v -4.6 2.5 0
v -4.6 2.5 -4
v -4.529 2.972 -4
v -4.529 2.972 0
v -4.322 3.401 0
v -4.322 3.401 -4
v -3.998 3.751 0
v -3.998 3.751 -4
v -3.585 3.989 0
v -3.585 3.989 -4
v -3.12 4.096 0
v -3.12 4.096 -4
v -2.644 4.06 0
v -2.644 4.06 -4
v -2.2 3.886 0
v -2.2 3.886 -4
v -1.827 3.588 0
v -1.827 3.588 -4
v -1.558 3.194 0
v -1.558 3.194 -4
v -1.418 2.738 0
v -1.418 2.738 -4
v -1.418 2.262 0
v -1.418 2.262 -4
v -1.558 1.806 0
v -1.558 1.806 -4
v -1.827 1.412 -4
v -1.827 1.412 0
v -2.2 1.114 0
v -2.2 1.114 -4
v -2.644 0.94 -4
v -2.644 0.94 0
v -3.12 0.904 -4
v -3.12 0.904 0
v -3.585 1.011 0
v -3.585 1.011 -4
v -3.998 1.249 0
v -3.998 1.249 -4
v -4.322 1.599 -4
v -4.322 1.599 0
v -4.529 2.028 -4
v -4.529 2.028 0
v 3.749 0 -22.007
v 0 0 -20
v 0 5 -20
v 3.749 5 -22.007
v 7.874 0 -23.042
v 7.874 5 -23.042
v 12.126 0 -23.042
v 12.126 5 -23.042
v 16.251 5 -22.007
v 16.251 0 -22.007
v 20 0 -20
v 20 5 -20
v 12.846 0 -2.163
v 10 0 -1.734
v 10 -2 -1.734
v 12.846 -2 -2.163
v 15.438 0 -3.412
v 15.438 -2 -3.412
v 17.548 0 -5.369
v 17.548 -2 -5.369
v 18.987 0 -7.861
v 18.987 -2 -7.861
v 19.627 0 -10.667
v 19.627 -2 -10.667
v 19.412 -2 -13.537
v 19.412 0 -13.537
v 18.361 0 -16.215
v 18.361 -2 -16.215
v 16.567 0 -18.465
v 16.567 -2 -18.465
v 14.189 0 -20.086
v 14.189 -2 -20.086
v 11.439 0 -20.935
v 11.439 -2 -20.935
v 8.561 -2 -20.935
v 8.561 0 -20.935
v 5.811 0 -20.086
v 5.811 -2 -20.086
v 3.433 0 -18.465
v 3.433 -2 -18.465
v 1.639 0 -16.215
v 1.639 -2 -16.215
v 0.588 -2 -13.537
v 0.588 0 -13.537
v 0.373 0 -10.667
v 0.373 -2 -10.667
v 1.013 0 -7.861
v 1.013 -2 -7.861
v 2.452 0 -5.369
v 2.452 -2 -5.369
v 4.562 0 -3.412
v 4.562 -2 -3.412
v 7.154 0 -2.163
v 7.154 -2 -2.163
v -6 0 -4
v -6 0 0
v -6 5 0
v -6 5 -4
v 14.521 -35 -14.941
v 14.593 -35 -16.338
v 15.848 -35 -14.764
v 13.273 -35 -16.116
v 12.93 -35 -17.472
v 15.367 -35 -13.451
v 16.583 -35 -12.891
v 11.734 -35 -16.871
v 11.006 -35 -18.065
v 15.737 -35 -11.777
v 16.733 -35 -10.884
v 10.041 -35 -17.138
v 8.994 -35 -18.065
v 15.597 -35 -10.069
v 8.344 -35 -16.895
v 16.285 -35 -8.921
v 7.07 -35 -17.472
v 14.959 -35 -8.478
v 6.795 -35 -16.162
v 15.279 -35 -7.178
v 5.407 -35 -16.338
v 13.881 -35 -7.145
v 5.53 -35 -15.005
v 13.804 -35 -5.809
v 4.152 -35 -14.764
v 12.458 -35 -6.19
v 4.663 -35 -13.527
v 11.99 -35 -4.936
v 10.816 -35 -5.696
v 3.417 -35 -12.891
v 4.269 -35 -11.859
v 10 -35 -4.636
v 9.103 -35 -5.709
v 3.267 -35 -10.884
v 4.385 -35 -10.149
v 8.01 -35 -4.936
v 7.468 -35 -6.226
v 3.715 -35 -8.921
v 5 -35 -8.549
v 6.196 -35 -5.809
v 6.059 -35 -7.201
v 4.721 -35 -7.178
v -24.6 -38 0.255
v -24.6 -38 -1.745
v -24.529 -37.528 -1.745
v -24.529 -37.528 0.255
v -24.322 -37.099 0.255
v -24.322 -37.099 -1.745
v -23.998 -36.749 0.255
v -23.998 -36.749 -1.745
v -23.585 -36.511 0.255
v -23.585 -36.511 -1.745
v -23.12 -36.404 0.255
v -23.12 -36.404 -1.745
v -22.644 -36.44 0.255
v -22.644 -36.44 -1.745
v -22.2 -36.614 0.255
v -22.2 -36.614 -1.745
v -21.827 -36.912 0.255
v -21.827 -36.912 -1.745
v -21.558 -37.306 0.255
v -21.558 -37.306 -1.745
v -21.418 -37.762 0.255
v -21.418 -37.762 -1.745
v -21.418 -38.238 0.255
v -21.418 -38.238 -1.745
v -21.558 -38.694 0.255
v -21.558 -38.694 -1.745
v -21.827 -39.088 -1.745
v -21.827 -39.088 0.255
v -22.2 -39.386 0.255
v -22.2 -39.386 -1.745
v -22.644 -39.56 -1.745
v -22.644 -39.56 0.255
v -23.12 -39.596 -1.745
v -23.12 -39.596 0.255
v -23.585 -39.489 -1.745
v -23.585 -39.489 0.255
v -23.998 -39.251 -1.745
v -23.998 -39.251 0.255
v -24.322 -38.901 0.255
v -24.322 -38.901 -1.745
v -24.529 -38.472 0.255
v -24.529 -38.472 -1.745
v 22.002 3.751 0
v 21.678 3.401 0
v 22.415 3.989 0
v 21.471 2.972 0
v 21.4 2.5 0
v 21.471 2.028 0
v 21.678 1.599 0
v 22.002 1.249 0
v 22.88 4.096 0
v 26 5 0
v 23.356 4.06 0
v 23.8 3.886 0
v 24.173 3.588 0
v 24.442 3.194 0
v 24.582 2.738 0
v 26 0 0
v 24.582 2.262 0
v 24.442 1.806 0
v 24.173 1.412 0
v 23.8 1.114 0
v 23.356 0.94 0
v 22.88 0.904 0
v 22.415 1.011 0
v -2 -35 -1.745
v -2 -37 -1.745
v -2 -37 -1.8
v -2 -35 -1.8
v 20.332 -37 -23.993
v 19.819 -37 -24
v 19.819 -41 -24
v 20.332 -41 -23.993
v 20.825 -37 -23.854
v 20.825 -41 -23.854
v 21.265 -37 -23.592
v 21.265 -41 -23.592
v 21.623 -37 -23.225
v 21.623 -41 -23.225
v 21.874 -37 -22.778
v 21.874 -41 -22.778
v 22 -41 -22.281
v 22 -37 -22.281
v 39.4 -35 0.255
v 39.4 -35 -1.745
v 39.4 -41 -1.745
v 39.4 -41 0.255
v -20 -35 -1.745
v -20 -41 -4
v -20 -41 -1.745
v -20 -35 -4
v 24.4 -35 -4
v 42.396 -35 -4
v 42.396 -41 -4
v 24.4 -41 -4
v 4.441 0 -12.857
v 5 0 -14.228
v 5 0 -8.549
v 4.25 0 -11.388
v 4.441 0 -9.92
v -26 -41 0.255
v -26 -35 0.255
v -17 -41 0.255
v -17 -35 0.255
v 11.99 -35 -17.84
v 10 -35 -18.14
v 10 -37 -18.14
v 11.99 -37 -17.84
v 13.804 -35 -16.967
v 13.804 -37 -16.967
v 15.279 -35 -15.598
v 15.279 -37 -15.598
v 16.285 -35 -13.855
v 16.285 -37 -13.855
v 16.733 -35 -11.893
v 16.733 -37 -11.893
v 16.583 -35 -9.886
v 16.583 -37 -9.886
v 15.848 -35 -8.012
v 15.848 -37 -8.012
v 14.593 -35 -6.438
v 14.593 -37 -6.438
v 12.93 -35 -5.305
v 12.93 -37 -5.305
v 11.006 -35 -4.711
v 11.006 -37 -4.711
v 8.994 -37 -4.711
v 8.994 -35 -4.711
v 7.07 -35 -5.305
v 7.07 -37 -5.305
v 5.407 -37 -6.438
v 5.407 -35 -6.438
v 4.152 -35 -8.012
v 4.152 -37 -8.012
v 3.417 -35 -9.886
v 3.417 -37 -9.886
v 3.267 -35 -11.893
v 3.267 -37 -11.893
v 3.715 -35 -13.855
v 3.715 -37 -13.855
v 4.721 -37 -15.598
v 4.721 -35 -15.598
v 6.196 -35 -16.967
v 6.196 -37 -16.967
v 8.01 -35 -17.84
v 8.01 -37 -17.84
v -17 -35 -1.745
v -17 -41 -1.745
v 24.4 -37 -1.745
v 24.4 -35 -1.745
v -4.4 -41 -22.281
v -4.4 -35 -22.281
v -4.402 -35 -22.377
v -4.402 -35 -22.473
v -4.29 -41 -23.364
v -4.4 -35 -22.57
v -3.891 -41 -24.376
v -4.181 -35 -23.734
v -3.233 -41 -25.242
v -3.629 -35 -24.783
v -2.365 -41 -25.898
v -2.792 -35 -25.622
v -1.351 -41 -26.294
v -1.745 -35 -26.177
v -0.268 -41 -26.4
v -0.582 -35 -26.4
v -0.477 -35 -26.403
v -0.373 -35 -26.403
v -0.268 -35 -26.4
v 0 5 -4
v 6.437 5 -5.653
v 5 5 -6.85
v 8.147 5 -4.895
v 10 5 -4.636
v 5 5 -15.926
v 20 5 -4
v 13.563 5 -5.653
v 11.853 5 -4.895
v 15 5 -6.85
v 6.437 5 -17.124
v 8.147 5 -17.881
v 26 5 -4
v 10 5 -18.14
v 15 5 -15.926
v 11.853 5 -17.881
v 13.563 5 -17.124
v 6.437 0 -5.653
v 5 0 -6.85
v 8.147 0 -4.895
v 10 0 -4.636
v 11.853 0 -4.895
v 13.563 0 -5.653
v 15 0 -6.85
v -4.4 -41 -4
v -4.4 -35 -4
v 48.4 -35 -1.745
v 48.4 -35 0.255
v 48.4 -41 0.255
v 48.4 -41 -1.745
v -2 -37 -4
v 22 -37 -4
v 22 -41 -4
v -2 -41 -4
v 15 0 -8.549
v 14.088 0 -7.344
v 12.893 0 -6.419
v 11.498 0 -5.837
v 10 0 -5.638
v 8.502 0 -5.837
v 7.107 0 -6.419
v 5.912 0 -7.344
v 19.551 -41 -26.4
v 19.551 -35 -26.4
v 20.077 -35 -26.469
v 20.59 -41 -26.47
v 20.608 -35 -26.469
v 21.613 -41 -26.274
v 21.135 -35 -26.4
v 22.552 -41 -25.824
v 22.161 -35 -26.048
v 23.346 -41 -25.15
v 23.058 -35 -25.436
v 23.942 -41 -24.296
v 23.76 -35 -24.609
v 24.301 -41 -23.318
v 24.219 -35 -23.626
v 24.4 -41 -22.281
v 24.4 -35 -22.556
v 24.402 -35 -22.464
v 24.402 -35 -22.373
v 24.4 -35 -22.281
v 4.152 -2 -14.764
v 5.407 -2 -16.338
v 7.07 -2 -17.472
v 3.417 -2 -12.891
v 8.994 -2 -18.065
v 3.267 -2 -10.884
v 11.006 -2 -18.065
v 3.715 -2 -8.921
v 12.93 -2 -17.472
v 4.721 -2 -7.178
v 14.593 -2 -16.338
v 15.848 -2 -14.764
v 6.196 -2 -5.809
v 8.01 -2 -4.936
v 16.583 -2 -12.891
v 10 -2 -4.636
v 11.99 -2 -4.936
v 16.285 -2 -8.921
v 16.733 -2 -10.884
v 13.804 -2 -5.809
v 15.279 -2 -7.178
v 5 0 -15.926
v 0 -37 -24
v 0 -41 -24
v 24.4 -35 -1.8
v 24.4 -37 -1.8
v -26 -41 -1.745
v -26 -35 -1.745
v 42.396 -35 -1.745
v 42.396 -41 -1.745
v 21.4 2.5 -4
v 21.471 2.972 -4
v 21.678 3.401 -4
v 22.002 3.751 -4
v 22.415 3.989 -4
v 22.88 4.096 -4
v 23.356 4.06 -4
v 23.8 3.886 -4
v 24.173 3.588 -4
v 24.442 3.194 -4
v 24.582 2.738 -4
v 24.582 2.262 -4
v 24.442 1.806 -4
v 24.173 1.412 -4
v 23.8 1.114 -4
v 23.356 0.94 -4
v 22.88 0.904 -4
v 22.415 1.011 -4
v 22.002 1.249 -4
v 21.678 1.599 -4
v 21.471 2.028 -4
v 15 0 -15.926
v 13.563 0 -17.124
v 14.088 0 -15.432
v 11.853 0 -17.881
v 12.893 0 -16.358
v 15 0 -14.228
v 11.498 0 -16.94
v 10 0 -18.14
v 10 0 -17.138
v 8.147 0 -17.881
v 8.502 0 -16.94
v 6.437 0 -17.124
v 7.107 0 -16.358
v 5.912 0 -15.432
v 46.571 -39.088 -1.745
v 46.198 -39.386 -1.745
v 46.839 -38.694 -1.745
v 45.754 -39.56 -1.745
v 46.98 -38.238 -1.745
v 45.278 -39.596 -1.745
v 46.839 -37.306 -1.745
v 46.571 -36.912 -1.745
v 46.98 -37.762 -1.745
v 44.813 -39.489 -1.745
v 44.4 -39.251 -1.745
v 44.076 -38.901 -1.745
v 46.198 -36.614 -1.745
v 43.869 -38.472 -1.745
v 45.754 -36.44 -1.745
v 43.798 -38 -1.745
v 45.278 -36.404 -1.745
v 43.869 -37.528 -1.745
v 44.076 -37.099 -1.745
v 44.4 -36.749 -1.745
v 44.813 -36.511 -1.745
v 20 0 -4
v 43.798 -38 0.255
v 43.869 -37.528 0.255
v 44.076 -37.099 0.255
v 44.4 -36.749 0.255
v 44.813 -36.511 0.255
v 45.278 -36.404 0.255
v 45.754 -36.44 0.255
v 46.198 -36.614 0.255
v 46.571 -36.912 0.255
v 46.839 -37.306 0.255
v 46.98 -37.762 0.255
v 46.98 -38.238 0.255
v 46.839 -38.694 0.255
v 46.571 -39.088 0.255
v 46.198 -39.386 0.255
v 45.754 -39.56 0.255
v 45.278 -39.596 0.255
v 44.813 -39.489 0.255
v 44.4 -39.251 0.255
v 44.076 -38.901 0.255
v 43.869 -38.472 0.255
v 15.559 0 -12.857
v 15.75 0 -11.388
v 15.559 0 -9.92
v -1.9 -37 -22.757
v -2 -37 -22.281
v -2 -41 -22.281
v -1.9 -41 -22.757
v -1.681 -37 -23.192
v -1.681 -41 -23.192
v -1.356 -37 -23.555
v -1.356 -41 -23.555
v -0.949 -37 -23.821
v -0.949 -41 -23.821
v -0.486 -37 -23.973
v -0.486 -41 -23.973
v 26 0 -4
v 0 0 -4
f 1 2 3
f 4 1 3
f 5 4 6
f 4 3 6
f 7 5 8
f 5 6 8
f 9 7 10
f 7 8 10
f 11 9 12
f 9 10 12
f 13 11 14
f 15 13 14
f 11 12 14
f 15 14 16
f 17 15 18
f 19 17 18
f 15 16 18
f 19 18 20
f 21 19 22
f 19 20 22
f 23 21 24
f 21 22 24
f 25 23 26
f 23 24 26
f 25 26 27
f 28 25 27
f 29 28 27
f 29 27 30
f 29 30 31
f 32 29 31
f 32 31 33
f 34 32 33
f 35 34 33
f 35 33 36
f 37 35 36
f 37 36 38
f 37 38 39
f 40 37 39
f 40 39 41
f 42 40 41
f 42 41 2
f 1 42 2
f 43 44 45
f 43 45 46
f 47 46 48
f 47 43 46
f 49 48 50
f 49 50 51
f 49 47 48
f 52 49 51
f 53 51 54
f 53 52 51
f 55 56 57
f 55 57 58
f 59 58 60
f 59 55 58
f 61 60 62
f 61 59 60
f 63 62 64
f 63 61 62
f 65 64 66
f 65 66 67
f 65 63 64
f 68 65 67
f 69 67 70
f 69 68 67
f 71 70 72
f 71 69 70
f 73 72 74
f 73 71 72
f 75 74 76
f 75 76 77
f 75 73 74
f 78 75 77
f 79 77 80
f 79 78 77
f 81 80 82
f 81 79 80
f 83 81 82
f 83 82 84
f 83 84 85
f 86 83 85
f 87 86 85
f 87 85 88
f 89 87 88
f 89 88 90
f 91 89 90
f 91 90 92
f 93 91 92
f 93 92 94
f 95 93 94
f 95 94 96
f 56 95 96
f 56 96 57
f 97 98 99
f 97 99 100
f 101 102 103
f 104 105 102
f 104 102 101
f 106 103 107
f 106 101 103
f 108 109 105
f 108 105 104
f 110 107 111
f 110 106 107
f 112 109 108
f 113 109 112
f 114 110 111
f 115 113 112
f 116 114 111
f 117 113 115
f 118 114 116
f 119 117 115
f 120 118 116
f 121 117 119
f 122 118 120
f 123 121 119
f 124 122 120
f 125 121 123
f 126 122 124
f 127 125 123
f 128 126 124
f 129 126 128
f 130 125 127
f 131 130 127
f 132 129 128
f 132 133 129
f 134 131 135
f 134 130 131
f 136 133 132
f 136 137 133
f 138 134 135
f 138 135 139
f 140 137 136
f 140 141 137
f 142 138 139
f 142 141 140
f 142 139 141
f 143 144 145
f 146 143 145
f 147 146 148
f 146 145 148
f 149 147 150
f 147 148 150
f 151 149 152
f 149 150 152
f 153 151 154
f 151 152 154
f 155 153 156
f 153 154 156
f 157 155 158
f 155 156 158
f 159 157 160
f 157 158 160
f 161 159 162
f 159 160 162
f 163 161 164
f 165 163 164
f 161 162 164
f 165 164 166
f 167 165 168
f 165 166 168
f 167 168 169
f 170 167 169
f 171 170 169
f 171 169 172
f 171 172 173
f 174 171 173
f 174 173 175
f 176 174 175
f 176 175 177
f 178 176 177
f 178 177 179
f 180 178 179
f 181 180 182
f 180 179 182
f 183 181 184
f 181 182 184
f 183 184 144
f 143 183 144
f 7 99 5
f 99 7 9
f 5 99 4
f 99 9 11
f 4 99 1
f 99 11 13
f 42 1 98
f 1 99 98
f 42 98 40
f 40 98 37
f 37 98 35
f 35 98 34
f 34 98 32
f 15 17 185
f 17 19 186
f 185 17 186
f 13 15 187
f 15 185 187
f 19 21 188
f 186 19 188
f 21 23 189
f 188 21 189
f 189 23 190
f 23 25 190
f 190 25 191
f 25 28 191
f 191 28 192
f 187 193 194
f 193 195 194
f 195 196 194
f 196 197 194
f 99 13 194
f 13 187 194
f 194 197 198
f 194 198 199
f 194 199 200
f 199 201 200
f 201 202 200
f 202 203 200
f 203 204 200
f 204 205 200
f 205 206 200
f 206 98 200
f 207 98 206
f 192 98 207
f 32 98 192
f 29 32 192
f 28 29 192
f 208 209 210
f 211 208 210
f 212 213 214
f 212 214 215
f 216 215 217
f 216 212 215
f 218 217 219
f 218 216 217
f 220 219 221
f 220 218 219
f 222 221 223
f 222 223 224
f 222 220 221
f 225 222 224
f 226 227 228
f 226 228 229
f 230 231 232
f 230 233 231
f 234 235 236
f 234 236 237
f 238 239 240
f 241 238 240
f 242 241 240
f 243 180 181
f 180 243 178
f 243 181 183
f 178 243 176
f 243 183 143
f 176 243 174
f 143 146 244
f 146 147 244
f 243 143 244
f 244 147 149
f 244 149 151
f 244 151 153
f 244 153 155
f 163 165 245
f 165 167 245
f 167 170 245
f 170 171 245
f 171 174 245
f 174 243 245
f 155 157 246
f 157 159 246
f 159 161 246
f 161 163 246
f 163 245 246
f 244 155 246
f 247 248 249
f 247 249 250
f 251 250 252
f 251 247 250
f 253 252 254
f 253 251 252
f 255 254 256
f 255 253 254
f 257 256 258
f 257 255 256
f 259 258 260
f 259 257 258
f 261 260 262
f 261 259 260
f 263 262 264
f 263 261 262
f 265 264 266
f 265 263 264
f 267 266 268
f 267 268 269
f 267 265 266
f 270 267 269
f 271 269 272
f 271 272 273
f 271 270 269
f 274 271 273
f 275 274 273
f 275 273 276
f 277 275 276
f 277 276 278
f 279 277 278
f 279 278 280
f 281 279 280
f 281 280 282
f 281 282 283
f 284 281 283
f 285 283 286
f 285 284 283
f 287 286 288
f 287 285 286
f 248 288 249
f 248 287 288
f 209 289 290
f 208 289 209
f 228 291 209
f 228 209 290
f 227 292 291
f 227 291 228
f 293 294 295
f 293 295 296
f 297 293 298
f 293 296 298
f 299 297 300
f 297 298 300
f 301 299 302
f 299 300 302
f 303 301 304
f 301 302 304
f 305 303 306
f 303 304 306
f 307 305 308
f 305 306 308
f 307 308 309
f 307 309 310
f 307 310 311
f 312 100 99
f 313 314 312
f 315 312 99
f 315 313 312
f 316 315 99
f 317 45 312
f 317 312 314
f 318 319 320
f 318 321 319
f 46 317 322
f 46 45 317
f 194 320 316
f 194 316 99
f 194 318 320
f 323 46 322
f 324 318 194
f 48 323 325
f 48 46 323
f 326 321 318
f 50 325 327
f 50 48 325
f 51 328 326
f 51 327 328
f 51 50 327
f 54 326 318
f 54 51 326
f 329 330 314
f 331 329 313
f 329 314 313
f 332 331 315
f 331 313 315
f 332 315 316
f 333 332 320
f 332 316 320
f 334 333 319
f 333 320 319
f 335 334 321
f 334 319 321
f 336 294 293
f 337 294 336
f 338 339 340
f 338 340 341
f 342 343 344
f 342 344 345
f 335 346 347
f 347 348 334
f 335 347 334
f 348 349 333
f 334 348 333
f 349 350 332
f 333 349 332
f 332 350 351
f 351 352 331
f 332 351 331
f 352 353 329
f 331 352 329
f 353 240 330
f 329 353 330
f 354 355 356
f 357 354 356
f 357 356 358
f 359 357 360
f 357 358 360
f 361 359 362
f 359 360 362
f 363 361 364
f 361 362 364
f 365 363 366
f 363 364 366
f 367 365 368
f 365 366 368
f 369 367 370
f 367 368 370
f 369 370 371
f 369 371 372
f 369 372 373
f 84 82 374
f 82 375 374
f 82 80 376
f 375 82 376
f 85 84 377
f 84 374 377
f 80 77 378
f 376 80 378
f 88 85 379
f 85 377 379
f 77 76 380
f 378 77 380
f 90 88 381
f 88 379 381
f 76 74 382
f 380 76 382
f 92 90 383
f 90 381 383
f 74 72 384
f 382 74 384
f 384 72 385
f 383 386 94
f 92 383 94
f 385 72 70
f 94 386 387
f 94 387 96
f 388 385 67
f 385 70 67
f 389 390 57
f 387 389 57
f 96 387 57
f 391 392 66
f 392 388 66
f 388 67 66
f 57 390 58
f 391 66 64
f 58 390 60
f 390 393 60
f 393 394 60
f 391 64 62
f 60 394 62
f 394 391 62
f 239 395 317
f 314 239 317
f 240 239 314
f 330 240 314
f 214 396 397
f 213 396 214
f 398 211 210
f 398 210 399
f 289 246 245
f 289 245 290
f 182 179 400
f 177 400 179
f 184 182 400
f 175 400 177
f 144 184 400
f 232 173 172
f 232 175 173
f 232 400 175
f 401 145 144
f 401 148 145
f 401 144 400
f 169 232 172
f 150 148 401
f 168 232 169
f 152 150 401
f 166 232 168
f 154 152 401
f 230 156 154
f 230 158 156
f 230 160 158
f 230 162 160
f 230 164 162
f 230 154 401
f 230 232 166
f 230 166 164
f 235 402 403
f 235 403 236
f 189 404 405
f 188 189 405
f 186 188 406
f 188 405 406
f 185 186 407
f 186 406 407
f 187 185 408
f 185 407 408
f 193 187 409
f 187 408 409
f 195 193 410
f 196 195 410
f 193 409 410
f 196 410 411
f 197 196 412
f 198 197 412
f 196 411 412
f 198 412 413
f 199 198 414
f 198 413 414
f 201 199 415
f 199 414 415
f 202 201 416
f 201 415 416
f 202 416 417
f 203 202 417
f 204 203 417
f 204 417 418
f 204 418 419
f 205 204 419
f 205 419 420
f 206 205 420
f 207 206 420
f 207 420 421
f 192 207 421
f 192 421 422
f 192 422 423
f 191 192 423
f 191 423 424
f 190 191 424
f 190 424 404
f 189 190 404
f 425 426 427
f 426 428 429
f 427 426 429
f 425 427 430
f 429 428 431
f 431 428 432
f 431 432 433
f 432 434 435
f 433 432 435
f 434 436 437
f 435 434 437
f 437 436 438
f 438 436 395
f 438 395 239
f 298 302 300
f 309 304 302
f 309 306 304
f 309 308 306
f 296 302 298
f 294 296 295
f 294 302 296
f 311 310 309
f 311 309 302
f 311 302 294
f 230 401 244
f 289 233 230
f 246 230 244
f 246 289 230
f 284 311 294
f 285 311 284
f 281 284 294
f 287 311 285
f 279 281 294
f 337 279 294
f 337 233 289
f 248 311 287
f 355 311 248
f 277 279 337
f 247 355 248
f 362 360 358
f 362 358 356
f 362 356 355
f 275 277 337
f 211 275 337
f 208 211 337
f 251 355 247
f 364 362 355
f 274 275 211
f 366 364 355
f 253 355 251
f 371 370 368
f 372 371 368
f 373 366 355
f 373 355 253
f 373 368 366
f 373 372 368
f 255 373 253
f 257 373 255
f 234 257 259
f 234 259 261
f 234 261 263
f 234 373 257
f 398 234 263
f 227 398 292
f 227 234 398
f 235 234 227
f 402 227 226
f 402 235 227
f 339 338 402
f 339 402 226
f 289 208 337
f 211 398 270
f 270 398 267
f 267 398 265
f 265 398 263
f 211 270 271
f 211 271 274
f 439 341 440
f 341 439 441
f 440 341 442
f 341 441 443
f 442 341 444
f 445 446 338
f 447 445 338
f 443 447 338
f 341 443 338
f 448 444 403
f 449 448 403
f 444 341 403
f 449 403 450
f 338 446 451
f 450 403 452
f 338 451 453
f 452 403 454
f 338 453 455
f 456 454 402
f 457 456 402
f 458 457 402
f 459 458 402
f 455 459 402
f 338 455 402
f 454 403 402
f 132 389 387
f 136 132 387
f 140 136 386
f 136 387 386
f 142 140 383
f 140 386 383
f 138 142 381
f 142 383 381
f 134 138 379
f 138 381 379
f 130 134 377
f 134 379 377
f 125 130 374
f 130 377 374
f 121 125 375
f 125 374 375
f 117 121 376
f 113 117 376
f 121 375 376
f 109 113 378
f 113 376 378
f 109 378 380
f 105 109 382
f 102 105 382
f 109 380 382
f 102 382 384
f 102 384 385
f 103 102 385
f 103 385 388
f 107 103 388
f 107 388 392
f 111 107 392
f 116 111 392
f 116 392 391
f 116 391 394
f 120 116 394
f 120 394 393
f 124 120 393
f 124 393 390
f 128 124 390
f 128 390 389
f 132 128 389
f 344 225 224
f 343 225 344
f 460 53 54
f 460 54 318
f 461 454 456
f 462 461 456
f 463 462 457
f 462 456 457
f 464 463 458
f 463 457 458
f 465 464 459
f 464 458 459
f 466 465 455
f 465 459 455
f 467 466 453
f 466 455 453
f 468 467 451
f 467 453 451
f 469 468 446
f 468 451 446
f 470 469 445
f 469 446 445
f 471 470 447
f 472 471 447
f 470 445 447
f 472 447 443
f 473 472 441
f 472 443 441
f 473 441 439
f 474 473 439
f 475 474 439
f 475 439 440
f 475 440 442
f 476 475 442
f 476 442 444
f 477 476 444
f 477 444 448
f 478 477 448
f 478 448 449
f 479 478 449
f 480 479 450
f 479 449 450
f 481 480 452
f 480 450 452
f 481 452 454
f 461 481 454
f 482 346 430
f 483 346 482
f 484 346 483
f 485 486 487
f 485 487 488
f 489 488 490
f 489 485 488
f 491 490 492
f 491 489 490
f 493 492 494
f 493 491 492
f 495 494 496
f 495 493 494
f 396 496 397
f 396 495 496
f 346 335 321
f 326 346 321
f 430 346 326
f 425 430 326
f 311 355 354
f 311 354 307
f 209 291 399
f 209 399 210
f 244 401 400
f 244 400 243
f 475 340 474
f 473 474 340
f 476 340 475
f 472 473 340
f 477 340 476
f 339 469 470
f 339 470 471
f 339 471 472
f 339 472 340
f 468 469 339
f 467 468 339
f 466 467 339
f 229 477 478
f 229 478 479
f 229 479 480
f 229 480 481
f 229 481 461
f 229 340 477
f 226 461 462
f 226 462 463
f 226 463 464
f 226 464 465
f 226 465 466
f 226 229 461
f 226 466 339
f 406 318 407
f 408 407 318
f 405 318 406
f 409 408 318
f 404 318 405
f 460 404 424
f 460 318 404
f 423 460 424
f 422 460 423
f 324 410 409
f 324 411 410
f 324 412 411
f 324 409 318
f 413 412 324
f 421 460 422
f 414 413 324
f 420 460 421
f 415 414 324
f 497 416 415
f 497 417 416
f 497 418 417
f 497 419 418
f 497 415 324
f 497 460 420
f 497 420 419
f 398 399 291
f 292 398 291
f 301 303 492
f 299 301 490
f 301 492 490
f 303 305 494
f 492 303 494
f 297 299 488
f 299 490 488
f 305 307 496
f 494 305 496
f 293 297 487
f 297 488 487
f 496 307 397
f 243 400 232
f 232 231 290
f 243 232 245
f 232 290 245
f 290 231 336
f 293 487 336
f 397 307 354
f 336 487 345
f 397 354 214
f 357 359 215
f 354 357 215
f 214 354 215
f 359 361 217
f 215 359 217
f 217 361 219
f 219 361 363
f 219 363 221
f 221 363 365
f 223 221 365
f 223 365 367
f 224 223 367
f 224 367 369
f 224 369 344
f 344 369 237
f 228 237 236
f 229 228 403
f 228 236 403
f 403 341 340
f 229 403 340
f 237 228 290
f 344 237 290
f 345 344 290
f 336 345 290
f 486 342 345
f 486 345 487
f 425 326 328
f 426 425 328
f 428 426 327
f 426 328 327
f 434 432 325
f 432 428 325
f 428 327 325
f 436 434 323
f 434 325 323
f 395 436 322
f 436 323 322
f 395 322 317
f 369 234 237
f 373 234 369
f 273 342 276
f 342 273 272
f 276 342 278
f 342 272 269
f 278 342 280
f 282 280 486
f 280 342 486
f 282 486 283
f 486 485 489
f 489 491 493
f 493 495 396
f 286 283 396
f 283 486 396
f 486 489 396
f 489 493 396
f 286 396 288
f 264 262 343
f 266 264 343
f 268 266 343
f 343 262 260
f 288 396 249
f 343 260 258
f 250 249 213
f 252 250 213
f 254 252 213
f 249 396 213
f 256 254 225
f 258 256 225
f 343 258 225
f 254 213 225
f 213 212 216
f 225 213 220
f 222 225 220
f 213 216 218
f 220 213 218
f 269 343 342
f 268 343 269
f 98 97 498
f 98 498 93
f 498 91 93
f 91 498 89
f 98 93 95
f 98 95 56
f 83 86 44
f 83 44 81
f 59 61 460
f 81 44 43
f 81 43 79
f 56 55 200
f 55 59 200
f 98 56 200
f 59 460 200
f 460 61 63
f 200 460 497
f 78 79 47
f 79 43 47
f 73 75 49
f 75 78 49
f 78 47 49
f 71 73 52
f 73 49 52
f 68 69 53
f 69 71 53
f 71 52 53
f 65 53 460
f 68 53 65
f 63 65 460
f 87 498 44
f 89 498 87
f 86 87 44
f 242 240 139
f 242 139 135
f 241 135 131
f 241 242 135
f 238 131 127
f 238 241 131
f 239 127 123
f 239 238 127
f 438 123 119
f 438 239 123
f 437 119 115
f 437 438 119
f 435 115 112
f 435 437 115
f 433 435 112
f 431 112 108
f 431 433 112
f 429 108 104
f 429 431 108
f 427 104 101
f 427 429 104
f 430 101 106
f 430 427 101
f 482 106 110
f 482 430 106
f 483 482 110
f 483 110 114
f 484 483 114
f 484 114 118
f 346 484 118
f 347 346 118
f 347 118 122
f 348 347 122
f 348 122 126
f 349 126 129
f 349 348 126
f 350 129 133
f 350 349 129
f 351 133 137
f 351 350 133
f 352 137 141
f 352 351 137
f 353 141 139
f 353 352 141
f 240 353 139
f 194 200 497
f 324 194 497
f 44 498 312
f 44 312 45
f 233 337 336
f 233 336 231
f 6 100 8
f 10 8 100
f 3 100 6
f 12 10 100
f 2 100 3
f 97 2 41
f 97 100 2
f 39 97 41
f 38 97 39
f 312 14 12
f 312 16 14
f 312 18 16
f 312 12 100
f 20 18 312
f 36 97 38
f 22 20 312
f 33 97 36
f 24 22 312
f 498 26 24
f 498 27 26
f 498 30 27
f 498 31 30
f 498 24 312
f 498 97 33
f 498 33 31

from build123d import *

# Parameters (mm, degrees)
SKETCH1_W            = 6
SKETCH1_H            = 4
BOSS_EXTRUDE1_DEPTH  = 5
SKETCH2_R            = 1.6
CUT_EXTRUDE1_DEPTH   = 5
SKETCH4_R            = 9.654229578
SKETCH4_R_2          = 6.752232565
BOSS_EXTRUDE3_DEPTH  = 7
SKETCH5_R            = 6.752232565
SKETCH5_R_2          = 5.75
BOSS_EXTRUDE4_DEPTH  = 35
BOSS_EXTRUDE5_DEPTH  = 6
SKETCH9_R            = 6.752232565
BOSS_EXTRUDE7_DEPTH  = 2
BOSS_EXTRUDE8_DEPTH  = 2
SKETCH11_W           = 26.4
SKETCH11_H           = 2
BOSS_EXTRUDE9_DEPTH  = 2.2
BOSS_EXTRUDE10_DEPTH = 4
SKETCH13_W           = 2
SKETCH13_H           = 6
BOSS_EXTRUDE11_DEPTH = 2
SKETCH14_W           = 2
SKETCH14_H           = 6
BOSS_EXTRUDE12_DEPTH = 2
SKETCH15_R           = 1.6
CUT_EXTRUDE2_DEPTH   = 2


with BuildPart() as part:
    # Sketch1 → Boss-Extrude1 (new body)
    # profile 1 of 3: a face of its own
    with BuildSketch(Plane(origin=(0, 0, 0), x_dir=(1, 0, 0), z_dir=(0, 1, 0))):
        with BuildLine():
            ThreePointArc((0, 20), (10, 23.172897988), (20, 20))
            Line((20, 20), (20, 0))
            Line((20, 0), (0, 0))
            Line((0, 0), (0, 20))
        make_face()
        with BuildLine():
            Line((5, 18.894117647), (5, 4))
            Line((5, 4), (15, 4))
            Line((15, 4), (15, 18.776470588))
            ThreePointArc((15, 18.776470588), (10.011911878, 19.847803762), (5, 18.894117647))
        make_face(mode=Mode.SUBTRACT)
    # profile 2 of 3: a face of its own
    with BuildSketch(Plane(origin=(0, 0, 0), x_dir=(1, 0, 0), z_dir=(0, 1, 0))):
        with Locations((-3, 2)):
            Rectangle(SKETCH1_W, SKETCH1_H)
    # profile 3 of 3: a face of its own
    with BuildSketch(Plane(origin=(0, 0, 0), x_dir=(1, 0, 0), z_dir=(0, 1, 0))):
        with Locations((23, 2)):
            Rectangle(SKETCH1_W, SKETCH1_H)
    extrude(amount=BOSS_EXTRUDE1_DEPTH)

    # Sketch2 → Cut-Extrude1 (cut)
    with BuildSketch(Plane(origin=(0, 0, -4), x_dir=(-1, 0, 0), z_dir=(0, 0, -1))):
        with Locations((3, 2.5)):
            Circle(SKETCH2_R)
        with Locations((-23, 2.5)):
            Circle(SKETCH2_R)
    extrude(amount=-CUT_EXTRUDE1_DEPTH, mode=Mode.SUBTRACT)

    # Sketch4 → Boss-Extrude3 (add)
    with BuildSketch(Plane(origin=(0, 5, 0), x_dir=(1, 0, 0), z_dir=(0, 1, 0))):
        with Locations(Location((10, 11.388235294, 0), (0, 0, 270))):
            Circle(SKETCH4_R)
        with Locations(Location((10, 11.388235294, 0), (0, 0, 270))):
            Circle(SKETCH4_R_2, mode=Mode.SUBTRACT)
    extrude(amount=-BOSS_EXTRUDE3_DEPTH)

    # Sketch5 → Boss-Extrude4 (add)
    with BuildSketch(Plane.XZ):
        with Locations(Location((10, -11.388235294, 0), (0, 0, 90))):
            Circle(SKETCH5_R)
        with Locations(Location((10, -11.388235294, 0), (0, 0, 150.408154206))):
            Circle(SKETCH5_R_2, mode=Mode.SUBTRACT)
    extrude(amount=BOSS_EXTRUDE4_DEPTH)


with BuildPart() as body_2:
    # Sketch7 → Boss-Extrude5 (new body)
    with BuildSketch(Plane.XZ.offset(35)):
        with BuildLine():
            ThreePointArc((-0.268165216, -26.4), (-3.233175608, -25.242402121), (-4.4, -22.281010504))
            Line((-4.4, -22.281010504), (-4.4, -4))
            Line((-4.4, -4), (-2, -4))
            Line((-2, -4), (-2, -22.281010504))
            ThreePointArc((-2, -22.281010504), (-1.356014381, -23.554718814), (0, -24))
            Line((0, -24), (19.818955029, -24))
            ThreePointArc((19.818955029, -24), (21.265491896, -23.592214456), (22, -22.281010504))
            Line((22, -22.281010504), (22, -4))
            Line((22, -4), (24.4, -4))
            Line((24.4, -4), (24.4, -22.281010504))
            ThreePointArc((24.4, -22.281010504), (22.970853326, -25.512440046), (19.550789813, -26.4))
            Line((19.550789813, -26.4), (-0.268165216, -26.4))
        make_face()
    extrude(amount=BOSS_EXTRUDE5_DEPTH)

    # Sketch9 → Boss-Extrude7 (add)
    with BuildSketch(Plane.XZ.offset(35)):
        with BuildLine():
            Line((24.4, -22.281010504), (24.4, -4))
            Line((24.4, -4), (-4.4, -4))
            Line((-4.4, -4), (-4.4, -22.569632221))
            ThreePointArc((-4.4, -22.569632221), (-3.241933512, -25.233644217), (-0.581540291, -26.4))
            Line((-0.581540291, -26.4), (-0.268165216, -26.4))
            Line((-0.268165216, -26.4), (19.550789813, -26.4))
            Line((19.550789813, -26.4), (21.134588718, -26.4))
            ThreePointArc((21.134588718, -26.4), (23.436778227, -25.046515144), (24.4, -22.555691665))
            Line((24.4, -22.555691665), (24.4, -22.281010504))
        make_face()
        with Locations(Location((10, -11.388235294, 0), (0, 0, 270))):
            Circle(SKETCH9_R, mode=Mode.SUBTRACT)
    extrude(amount=BOSS_EXTRUDE7_DEPTH)

    # Sketch10 → Boss-Extrude8 (add)
    with BuildSketch(Plane.XZ.offset(37)):
        Polygon((-2, -1.744918399), (-2, -4), (-20, -4), (-20, -1.744918399), (-24, -1.744918399), (-24, 0.255081601), (-17, 0.255081601), (-17, -1.744918399), align=None)
        Polygon((42.395891067, -1.744918399), (42.395891067, -4), (24.4, -4), (24.4, -1.744918399), (39.4, -1.744918399), (39.4, 0.255081601), (46.4, 0.255081601), (46.4, -1.744918399), align=None)
    extrude(amount=-BOSS_EXTRUDE8_DEPTH)


with BuildPart() as boss_extrude8_piece_1:
    # of the separate pieces the step leaves, piece 1, a body of its own (boss_extrude8_pieces)
    add(body_2.part.solids().sort_by_distance((-2, -35, -4))[0])



with BuildPart() as boss_extrude8_piece_2:
    # of the separate pieces the step leaves, piece 2, a body of its own (boss_extrude8_pieces)
    add(body_2.part.solids().sort_by_distance((42.395891067, -37, -4))[0])


with BuildPart() as boss_extrude8_piece_1_1:
    add(boss_extrude8_piece_1.part)

    add(boss_extrude8_piece_2.part)  # Boss-Extrude9 merges Boss-Extrude8 piece 2
    # Sketch11 → Boss-Extrude9 (add)
    with BuildSketch(Plane.XY.offset(-4)):
        with Locations((11.2, -36)):
            Rectangle(SKETCH11_W, SKETCH11_H)
    extrude(amount=BOSS_EXTRUDE9_DEPTH)

    # Sketch12 → Boss-Extrude10 (add)
    with BuildSketch(Plane.XZ.offset(37)):
        Polygon((-20, -1.744918399), (-24, -1.744918399), (-24, 0.255081601), (-17, 0.255081601), (-17, -1.744918399), (39.4, -1.744918399), (39.4, 0.255081601), (46.4, 0.255081601), (46.4, -1.744918399), (42.395891067, -1.744918399), (42.395891067, -4), (-20, -4), align=None)
    extrude(amount=BOSS_EXTRUDE10_DEPTH)

    # Sketch13 → Boss-Extrude11 (add)
    with BuildSketch(Plane(origin=(46.4, 0, 0), x_dir=(0, 0, -1), z_dir=(1, 0, 0))):
        with Locations((0.744918399, -38)):
            Rectangle(SKETCH13_W, SKETCH13_H)
    extrude(amount=BOSS_EXTRUDE11_DEPTH)

    # Sketch14 → Boss-Extrude12 (add)
    with BuildSketch(Plane.ZY.offset(24)):
        with Locations((-0.744918399, -38)):
            Rectangle(SKETCH14_W, SKETCH14_H)
    extrude(amount=BOSS_EXTRUDE12_DEPTH)

    # Sketch15 → Cut-Extrude2 (cut)
    with BuildSketch(Plane(origin=(0, 0, -1.744918399), x_dir=(-1, 0, 0), z_dir=(0, 0, -1))):
        with Locations((-45.397945533, -38)):
            Circle(SKETCH15_R)
        with Locations((23, -38)):
            Circle(SKETCH15_R)
    extrude(amount=-CUT_EXTRUDE2_DEPTH, mode=Mode.SUBTRACT)


solid = Compound([part.part, boss_extrude8_piece_1_1.part])
